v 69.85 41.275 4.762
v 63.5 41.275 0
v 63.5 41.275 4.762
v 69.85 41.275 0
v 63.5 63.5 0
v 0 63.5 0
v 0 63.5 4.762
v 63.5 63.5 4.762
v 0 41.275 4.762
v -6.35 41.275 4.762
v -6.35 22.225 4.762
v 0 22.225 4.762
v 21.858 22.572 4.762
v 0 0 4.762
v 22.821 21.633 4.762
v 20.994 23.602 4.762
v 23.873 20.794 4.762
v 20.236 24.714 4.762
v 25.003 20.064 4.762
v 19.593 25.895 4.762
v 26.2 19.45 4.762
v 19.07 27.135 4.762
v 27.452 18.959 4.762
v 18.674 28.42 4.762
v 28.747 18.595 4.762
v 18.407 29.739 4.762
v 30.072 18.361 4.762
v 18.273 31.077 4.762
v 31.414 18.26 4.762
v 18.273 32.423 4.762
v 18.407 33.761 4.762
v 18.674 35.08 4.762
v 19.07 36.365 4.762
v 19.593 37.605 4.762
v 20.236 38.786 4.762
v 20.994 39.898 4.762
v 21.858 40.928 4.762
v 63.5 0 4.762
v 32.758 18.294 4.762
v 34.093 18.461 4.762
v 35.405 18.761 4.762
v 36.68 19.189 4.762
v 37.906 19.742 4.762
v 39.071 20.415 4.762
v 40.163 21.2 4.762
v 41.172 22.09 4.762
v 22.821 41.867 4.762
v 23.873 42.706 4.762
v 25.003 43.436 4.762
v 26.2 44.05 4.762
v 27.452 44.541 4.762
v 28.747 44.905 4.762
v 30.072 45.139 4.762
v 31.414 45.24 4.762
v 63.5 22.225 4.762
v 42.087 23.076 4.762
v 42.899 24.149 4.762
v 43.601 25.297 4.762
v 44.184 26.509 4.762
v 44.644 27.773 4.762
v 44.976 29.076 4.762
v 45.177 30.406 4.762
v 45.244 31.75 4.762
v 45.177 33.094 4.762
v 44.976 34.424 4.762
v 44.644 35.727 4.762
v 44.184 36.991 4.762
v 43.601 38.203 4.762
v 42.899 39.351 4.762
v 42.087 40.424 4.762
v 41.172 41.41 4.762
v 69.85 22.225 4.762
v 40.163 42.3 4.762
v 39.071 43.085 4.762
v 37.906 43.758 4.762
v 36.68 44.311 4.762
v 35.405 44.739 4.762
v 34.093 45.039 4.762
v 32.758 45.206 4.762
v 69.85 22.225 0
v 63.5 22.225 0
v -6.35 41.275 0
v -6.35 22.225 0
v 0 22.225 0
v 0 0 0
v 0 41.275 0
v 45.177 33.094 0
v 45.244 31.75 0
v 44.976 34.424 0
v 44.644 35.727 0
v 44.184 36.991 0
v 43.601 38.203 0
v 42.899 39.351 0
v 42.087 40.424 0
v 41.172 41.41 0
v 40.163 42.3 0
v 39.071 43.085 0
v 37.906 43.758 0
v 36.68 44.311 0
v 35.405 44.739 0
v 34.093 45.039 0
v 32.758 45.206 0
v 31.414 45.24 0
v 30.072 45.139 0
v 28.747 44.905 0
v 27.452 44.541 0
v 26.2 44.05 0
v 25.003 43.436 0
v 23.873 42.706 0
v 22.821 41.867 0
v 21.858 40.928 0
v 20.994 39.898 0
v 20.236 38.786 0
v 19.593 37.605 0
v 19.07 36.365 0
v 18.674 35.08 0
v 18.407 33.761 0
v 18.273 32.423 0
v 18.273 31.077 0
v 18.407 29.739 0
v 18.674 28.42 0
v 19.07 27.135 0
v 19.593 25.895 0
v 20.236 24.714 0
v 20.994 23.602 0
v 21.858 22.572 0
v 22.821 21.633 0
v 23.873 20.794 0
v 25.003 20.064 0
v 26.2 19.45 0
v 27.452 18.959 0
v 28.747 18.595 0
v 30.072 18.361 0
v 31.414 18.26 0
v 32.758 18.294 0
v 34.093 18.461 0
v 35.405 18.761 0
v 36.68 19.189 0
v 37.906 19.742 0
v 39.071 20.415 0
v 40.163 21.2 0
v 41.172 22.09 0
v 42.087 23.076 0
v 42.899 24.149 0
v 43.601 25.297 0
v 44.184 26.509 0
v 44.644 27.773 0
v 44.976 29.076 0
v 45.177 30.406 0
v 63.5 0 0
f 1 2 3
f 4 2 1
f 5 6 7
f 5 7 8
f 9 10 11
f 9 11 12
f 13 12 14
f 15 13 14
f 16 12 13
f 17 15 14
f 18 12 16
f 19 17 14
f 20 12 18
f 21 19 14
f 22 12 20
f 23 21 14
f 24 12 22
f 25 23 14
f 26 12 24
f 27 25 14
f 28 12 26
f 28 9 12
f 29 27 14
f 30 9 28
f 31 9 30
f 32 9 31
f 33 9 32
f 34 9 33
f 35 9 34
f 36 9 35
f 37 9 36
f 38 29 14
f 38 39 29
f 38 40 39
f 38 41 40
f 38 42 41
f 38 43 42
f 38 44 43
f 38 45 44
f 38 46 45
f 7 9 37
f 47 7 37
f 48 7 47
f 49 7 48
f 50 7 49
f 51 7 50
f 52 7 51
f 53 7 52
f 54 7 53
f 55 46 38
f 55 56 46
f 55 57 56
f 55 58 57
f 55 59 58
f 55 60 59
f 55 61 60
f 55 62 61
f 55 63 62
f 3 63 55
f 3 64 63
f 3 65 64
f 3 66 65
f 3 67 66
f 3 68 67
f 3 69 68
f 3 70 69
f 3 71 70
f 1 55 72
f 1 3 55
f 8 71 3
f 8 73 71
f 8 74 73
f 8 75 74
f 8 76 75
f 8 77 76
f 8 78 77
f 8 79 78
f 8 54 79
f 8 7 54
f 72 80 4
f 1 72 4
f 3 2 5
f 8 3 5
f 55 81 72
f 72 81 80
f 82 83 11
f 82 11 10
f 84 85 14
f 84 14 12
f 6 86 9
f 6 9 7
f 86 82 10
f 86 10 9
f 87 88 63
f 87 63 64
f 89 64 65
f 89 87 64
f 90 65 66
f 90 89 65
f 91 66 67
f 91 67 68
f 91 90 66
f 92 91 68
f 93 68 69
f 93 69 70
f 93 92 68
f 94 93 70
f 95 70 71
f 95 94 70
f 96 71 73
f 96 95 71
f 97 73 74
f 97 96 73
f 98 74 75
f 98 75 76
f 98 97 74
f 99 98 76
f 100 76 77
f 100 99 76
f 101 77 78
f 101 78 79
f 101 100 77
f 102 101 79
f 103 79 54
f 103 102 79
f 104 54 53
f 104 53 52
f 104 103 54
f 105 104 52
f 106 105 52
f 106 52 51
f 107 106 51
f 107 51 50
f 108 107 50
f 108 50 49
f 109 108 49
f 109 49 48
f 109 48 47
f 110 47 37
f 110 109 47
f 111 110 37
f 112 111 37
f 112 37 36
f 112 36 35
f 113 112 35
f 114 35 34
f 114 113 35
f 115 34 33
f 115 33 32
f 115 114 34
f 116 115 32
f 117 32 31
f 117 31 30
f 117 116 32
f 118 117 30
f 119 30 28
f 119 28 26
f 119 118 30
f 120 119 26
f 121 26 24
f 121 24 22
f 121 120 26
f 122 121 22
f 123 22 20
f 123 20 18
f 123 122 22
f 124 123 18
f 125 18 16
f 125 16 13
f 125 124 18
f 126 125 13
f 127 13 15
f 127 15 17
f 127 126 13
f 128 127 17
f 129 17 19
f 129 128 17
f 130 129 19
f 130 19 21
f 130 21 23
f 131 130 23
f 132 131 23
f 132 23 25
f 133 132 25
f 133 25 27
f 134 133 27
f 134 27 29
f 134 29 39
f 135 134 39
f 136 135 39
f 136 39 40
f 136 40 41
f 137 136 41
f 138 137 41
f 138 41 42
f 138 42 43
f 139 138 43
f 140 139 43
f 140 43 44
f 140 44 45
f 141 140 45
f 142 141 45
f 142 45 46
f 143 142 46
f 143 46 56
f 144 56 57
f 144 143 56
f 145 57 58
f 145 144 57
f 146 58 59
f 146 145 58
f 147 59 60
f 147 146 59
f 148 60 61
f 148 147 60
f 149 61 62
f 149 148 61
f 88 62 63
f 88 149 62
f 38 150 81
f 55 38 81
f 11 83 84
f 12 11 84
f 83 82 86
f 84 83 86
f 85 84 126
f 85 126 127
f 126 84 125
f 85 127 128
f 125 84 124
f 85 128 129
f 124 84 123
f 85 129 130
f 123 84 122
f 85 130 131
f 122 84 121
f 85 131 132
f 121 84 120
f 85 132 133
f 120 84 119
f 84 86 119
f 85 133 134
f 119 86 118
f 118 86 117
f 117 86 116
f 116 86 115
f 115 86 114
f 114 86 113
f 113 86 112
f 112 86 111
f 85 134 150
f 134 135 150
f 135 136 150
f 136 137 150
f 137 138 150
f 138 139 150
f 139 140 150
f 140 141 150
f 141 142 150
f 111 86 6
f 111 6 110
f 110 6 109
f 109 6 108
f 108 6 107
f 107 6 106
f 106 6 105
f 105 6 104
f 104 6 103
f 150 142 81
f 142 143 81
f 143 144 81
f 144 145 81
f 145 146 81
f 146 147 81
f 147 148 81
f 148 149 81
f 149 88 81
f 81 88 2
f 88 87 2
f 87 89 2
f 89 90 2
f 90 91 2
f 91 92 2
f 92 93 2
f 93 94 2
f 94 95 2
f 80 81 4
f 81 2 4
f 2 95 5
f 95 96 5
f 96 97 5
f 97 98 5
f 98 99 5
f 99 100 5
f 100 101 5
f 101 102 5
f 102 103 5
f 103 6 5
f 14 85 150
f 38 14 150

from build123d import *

# Parameters (mm, degrees)
SKETCH1_W           = 63.5
SKETCH1_H           = 63.5
SKETCH1_R           = 13.49375
SKETCH1_W_2         = 6.35
SKETCH1_H_2         = 19.05
BOSS_EXTRUDE1_DEPTH = 4.7625


with BuildPart() as part:
    # Sketch1 → Boss-Extrude1 (new body)
    with BuildSketch(Plane.XY):
        with Locations((31.75, 31.75)):
            Rectangle(SKETCH1_W, SKETCH1_H)
        with Locations((31.75, 31.75)):
            Circle(SKETCH1_R, mode=Mode.SUBTRACT)
        with Locations((-3.175, 31.75)):
            Rectangle(SKETCH1_W_2, SKETCH1_H_2)
        with Locations((66.675, 31.75)):
            Rectangle(SKETCH1_W_2, SKETCH1_H_2)
    extrude(amount=BOSS_EXTRUDE1_DEPTH)


solid = part.part
